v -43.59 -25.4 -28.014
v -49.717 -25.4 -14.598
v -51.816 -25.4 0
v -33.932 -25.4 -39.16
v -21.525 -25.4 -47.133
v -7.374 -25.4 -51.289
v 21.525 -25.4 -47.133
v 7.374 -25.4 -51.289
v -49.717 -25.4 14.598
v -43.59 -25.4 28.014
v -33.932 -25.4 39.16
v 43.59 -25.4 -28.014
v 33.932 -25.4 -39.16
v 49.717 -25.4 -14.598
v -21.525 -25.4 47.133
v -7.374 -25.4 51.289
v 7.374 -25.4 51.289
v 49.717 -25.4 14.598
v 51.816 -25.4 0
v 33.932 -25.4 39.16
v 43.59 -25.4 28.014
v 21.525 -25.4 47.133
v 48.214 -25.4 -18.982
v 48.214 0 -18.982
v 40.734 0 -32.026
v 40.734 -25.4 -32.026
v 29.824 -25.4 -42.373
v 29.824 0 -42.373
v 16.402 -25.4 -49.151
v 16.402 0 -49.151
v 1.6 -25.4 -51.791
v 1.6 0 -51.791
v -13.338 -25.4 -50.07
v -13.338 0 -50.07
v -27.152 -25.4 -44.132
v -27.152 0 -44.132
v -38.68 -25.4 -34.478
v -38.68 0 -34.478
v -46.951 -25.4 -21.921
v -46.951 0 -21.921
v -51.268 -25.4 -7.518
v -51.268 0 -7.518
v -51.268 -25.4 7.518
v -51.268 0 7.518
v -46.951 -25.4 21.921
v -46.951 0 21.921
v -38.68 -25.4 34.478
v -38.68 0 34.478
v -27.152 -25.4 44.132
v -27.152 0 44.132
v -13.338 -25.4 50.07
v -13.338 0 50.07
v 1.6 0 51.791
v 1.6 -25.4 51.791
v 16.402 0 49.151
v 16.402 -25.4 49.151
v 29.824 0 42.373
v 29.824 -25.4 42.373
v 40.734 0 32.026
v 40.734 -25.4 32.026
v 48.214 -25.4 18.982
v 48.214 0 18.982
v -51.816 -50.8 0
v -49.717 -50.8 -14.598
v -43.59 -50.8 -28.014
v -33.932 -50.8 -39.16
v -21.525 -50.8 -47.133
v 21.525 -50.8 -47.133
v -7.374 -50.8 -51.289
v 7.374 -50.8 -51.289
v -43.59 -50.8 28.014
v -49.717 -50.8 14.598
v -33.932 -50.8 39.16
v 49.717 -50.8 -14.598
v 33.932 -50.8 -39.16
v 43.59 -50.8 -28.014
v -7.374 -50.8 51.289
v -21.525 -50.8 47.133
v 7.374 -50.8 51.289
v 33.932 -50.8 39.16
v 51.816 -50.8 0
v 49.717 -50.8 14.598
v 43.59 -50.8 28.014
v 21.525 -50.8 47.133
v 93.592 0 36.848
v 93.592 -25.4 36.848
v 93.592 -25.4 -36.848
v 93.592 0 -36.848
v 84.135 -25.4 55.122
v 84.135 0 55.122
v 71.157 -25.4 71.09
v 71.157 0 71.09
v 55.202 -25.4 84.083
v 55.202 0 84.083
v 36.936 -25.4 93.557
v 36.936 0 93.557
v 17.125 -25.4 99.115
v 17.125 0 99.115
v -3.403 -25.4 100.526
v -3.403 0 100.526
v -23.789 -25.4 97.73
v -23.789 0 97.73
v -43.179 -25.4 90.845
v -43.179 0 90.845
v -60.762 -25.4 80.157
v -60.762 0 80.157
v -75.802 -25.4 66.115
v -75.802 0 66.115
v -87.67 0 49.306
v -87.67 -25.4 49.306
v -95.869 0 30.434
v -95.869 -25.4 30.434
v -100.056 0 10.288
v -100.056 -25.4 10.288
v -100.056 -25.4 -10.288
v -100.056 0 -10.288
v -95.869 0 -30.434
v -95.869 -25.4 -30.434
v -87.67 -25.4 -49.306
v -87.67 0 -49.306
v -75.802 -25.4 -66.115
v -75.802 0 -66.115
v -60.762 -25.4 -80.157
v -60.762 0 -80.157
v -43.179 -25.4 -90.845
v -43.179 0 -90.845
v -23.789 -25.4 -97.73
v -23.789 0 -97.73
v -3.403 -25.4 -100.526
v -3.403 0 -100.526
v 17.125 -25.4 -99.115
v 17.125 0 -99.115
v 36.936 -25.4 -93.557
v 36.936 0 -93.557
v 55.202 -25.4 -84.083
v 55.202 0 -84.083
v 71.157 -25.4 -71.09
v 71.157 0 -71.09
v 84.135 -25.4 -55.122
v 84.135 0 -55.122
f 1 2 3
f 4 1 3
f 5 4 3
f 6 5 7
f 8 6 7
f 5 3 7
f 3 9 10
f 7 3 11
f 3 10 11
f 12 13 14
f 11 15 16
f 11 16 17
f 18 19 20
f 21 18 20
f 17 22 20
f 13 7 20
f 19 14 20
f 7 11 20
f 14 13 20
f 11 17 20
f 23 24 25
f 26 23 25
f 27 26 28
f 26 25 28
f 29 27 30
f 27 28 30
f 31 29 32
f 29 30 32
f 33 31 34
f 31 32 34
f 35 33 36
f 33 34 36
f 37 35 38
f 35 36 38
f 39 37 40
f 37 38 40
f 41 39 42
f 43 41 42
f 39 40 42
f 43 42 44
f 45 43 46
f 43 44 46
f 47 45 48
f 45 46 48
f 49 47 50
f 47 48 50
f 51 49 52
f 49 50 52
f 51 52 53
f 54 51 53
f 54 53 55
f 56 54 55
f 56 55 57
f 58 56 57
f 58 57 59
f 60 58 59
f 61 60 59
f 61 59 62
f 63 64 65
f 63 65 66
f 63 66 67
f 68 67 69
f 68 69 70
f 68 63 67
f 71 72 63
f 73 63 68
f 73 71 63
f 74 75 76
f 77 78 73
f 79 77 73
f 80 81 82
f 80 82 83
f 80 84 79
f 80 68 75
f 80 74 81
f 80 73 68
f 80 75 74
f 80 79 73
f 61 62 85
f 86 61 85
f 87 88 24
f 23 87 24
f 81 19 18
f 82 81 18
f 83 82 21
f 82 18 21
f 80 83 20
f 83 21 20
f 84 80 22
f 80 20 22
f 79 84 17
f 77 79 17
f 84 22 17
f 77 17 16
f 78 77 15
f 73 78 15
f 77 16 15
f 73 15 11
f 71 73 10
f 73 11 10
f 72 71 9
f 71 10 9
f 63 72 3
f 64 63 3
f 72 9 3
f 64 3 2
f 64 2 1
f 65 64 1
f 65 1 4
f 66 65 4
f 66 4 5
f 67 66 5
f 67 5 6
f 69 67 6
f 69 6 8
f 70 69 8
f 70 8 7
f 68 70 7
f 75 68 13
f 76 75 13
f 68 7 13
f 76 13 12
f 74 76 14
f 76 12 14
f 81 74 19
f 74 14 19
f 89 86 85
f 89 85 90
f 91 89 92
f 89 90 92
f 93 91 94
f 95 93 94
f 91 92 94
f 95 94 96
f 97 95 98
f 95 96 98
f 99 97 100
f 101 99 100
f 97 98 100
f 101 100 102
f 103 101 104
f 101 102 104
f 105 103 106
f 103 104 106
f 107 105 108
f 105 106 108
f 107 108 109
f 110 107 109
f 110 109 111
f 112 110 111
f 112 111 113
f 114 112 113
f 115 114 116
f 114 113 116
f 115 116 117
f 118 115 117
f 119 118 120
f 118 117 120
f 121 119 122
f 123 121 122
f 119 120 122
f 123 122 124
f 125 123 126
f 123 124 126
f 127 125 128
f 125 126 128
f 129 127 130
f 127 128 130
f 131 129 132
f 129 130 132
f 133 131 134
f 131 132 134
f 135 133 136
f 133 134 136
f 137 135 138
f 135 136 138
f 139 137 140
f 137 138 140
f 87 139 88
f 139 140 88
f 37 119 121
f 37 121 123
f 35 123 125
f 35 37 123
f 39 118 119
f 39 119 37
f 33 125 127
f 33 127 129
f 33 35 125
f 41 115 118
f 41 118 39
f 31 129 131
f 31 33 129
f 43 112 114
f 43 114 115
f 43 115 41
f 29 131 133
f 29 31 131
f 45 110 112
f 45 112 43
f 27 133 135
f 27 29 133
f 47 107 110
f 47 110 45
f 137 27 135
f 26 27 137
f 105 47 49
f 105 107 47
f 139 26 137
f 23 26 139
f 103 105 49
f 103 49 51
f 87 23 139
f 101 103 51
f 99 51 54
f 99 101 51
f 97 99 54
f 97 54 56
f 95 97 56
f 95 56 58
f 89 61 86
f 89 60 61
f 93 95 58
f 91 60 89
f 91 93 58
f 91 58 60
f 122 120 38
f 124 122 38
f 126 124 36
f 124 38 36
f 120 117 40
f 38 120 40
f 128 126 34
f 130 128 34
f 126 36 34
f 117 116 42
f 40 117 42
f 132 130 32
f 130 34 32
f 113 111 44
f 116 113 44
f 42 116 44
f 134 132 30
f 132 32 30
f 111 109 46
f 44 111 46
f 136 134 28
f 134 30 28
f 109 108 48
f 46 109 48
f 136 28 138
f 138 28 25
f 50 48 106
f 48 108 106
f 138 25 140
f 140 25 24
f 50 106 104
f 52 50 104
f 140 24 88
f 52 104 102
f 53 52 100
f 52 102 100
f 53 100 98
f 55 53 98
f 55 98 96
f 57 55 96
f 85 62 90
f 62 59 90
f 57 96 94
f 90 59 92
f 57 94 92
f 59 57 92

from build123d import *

# Parameters (mm, degrees)
F1_DEPTH = 25.4
F2_R     = 51.816
F3_DEPTH = 25.4


with BuildPart() as f1:
    # F0 (on Front) → F1 (new body)
    with BuildSketch(Plane.XZ):
        with BuildLine():
            Line((48.21383, 18.982213), (93.591553, 36.847825))
            ThreePointArc((93.591553, 36.847825), (-100.584, 0), (93.591553, -36.847825))
            Line((93.591553, -36.847825), (48.21383, -18.982213))
            ThreePointArc((48.21383, -18.982213), (-51.816, 0), (48.21383, 18.982213))
        make_face()
    extrude(amount=F1_DEPTH)


with BuildPart() as f3:
    # F2 (on face) → F3 (new body)
    with BuildSketch(Plane.XZ.offset(25.4)):
        Circle(F2_R)
    extrude(amount=F3_DEPTH)


solid = Compound([f1.part, f3.part])
